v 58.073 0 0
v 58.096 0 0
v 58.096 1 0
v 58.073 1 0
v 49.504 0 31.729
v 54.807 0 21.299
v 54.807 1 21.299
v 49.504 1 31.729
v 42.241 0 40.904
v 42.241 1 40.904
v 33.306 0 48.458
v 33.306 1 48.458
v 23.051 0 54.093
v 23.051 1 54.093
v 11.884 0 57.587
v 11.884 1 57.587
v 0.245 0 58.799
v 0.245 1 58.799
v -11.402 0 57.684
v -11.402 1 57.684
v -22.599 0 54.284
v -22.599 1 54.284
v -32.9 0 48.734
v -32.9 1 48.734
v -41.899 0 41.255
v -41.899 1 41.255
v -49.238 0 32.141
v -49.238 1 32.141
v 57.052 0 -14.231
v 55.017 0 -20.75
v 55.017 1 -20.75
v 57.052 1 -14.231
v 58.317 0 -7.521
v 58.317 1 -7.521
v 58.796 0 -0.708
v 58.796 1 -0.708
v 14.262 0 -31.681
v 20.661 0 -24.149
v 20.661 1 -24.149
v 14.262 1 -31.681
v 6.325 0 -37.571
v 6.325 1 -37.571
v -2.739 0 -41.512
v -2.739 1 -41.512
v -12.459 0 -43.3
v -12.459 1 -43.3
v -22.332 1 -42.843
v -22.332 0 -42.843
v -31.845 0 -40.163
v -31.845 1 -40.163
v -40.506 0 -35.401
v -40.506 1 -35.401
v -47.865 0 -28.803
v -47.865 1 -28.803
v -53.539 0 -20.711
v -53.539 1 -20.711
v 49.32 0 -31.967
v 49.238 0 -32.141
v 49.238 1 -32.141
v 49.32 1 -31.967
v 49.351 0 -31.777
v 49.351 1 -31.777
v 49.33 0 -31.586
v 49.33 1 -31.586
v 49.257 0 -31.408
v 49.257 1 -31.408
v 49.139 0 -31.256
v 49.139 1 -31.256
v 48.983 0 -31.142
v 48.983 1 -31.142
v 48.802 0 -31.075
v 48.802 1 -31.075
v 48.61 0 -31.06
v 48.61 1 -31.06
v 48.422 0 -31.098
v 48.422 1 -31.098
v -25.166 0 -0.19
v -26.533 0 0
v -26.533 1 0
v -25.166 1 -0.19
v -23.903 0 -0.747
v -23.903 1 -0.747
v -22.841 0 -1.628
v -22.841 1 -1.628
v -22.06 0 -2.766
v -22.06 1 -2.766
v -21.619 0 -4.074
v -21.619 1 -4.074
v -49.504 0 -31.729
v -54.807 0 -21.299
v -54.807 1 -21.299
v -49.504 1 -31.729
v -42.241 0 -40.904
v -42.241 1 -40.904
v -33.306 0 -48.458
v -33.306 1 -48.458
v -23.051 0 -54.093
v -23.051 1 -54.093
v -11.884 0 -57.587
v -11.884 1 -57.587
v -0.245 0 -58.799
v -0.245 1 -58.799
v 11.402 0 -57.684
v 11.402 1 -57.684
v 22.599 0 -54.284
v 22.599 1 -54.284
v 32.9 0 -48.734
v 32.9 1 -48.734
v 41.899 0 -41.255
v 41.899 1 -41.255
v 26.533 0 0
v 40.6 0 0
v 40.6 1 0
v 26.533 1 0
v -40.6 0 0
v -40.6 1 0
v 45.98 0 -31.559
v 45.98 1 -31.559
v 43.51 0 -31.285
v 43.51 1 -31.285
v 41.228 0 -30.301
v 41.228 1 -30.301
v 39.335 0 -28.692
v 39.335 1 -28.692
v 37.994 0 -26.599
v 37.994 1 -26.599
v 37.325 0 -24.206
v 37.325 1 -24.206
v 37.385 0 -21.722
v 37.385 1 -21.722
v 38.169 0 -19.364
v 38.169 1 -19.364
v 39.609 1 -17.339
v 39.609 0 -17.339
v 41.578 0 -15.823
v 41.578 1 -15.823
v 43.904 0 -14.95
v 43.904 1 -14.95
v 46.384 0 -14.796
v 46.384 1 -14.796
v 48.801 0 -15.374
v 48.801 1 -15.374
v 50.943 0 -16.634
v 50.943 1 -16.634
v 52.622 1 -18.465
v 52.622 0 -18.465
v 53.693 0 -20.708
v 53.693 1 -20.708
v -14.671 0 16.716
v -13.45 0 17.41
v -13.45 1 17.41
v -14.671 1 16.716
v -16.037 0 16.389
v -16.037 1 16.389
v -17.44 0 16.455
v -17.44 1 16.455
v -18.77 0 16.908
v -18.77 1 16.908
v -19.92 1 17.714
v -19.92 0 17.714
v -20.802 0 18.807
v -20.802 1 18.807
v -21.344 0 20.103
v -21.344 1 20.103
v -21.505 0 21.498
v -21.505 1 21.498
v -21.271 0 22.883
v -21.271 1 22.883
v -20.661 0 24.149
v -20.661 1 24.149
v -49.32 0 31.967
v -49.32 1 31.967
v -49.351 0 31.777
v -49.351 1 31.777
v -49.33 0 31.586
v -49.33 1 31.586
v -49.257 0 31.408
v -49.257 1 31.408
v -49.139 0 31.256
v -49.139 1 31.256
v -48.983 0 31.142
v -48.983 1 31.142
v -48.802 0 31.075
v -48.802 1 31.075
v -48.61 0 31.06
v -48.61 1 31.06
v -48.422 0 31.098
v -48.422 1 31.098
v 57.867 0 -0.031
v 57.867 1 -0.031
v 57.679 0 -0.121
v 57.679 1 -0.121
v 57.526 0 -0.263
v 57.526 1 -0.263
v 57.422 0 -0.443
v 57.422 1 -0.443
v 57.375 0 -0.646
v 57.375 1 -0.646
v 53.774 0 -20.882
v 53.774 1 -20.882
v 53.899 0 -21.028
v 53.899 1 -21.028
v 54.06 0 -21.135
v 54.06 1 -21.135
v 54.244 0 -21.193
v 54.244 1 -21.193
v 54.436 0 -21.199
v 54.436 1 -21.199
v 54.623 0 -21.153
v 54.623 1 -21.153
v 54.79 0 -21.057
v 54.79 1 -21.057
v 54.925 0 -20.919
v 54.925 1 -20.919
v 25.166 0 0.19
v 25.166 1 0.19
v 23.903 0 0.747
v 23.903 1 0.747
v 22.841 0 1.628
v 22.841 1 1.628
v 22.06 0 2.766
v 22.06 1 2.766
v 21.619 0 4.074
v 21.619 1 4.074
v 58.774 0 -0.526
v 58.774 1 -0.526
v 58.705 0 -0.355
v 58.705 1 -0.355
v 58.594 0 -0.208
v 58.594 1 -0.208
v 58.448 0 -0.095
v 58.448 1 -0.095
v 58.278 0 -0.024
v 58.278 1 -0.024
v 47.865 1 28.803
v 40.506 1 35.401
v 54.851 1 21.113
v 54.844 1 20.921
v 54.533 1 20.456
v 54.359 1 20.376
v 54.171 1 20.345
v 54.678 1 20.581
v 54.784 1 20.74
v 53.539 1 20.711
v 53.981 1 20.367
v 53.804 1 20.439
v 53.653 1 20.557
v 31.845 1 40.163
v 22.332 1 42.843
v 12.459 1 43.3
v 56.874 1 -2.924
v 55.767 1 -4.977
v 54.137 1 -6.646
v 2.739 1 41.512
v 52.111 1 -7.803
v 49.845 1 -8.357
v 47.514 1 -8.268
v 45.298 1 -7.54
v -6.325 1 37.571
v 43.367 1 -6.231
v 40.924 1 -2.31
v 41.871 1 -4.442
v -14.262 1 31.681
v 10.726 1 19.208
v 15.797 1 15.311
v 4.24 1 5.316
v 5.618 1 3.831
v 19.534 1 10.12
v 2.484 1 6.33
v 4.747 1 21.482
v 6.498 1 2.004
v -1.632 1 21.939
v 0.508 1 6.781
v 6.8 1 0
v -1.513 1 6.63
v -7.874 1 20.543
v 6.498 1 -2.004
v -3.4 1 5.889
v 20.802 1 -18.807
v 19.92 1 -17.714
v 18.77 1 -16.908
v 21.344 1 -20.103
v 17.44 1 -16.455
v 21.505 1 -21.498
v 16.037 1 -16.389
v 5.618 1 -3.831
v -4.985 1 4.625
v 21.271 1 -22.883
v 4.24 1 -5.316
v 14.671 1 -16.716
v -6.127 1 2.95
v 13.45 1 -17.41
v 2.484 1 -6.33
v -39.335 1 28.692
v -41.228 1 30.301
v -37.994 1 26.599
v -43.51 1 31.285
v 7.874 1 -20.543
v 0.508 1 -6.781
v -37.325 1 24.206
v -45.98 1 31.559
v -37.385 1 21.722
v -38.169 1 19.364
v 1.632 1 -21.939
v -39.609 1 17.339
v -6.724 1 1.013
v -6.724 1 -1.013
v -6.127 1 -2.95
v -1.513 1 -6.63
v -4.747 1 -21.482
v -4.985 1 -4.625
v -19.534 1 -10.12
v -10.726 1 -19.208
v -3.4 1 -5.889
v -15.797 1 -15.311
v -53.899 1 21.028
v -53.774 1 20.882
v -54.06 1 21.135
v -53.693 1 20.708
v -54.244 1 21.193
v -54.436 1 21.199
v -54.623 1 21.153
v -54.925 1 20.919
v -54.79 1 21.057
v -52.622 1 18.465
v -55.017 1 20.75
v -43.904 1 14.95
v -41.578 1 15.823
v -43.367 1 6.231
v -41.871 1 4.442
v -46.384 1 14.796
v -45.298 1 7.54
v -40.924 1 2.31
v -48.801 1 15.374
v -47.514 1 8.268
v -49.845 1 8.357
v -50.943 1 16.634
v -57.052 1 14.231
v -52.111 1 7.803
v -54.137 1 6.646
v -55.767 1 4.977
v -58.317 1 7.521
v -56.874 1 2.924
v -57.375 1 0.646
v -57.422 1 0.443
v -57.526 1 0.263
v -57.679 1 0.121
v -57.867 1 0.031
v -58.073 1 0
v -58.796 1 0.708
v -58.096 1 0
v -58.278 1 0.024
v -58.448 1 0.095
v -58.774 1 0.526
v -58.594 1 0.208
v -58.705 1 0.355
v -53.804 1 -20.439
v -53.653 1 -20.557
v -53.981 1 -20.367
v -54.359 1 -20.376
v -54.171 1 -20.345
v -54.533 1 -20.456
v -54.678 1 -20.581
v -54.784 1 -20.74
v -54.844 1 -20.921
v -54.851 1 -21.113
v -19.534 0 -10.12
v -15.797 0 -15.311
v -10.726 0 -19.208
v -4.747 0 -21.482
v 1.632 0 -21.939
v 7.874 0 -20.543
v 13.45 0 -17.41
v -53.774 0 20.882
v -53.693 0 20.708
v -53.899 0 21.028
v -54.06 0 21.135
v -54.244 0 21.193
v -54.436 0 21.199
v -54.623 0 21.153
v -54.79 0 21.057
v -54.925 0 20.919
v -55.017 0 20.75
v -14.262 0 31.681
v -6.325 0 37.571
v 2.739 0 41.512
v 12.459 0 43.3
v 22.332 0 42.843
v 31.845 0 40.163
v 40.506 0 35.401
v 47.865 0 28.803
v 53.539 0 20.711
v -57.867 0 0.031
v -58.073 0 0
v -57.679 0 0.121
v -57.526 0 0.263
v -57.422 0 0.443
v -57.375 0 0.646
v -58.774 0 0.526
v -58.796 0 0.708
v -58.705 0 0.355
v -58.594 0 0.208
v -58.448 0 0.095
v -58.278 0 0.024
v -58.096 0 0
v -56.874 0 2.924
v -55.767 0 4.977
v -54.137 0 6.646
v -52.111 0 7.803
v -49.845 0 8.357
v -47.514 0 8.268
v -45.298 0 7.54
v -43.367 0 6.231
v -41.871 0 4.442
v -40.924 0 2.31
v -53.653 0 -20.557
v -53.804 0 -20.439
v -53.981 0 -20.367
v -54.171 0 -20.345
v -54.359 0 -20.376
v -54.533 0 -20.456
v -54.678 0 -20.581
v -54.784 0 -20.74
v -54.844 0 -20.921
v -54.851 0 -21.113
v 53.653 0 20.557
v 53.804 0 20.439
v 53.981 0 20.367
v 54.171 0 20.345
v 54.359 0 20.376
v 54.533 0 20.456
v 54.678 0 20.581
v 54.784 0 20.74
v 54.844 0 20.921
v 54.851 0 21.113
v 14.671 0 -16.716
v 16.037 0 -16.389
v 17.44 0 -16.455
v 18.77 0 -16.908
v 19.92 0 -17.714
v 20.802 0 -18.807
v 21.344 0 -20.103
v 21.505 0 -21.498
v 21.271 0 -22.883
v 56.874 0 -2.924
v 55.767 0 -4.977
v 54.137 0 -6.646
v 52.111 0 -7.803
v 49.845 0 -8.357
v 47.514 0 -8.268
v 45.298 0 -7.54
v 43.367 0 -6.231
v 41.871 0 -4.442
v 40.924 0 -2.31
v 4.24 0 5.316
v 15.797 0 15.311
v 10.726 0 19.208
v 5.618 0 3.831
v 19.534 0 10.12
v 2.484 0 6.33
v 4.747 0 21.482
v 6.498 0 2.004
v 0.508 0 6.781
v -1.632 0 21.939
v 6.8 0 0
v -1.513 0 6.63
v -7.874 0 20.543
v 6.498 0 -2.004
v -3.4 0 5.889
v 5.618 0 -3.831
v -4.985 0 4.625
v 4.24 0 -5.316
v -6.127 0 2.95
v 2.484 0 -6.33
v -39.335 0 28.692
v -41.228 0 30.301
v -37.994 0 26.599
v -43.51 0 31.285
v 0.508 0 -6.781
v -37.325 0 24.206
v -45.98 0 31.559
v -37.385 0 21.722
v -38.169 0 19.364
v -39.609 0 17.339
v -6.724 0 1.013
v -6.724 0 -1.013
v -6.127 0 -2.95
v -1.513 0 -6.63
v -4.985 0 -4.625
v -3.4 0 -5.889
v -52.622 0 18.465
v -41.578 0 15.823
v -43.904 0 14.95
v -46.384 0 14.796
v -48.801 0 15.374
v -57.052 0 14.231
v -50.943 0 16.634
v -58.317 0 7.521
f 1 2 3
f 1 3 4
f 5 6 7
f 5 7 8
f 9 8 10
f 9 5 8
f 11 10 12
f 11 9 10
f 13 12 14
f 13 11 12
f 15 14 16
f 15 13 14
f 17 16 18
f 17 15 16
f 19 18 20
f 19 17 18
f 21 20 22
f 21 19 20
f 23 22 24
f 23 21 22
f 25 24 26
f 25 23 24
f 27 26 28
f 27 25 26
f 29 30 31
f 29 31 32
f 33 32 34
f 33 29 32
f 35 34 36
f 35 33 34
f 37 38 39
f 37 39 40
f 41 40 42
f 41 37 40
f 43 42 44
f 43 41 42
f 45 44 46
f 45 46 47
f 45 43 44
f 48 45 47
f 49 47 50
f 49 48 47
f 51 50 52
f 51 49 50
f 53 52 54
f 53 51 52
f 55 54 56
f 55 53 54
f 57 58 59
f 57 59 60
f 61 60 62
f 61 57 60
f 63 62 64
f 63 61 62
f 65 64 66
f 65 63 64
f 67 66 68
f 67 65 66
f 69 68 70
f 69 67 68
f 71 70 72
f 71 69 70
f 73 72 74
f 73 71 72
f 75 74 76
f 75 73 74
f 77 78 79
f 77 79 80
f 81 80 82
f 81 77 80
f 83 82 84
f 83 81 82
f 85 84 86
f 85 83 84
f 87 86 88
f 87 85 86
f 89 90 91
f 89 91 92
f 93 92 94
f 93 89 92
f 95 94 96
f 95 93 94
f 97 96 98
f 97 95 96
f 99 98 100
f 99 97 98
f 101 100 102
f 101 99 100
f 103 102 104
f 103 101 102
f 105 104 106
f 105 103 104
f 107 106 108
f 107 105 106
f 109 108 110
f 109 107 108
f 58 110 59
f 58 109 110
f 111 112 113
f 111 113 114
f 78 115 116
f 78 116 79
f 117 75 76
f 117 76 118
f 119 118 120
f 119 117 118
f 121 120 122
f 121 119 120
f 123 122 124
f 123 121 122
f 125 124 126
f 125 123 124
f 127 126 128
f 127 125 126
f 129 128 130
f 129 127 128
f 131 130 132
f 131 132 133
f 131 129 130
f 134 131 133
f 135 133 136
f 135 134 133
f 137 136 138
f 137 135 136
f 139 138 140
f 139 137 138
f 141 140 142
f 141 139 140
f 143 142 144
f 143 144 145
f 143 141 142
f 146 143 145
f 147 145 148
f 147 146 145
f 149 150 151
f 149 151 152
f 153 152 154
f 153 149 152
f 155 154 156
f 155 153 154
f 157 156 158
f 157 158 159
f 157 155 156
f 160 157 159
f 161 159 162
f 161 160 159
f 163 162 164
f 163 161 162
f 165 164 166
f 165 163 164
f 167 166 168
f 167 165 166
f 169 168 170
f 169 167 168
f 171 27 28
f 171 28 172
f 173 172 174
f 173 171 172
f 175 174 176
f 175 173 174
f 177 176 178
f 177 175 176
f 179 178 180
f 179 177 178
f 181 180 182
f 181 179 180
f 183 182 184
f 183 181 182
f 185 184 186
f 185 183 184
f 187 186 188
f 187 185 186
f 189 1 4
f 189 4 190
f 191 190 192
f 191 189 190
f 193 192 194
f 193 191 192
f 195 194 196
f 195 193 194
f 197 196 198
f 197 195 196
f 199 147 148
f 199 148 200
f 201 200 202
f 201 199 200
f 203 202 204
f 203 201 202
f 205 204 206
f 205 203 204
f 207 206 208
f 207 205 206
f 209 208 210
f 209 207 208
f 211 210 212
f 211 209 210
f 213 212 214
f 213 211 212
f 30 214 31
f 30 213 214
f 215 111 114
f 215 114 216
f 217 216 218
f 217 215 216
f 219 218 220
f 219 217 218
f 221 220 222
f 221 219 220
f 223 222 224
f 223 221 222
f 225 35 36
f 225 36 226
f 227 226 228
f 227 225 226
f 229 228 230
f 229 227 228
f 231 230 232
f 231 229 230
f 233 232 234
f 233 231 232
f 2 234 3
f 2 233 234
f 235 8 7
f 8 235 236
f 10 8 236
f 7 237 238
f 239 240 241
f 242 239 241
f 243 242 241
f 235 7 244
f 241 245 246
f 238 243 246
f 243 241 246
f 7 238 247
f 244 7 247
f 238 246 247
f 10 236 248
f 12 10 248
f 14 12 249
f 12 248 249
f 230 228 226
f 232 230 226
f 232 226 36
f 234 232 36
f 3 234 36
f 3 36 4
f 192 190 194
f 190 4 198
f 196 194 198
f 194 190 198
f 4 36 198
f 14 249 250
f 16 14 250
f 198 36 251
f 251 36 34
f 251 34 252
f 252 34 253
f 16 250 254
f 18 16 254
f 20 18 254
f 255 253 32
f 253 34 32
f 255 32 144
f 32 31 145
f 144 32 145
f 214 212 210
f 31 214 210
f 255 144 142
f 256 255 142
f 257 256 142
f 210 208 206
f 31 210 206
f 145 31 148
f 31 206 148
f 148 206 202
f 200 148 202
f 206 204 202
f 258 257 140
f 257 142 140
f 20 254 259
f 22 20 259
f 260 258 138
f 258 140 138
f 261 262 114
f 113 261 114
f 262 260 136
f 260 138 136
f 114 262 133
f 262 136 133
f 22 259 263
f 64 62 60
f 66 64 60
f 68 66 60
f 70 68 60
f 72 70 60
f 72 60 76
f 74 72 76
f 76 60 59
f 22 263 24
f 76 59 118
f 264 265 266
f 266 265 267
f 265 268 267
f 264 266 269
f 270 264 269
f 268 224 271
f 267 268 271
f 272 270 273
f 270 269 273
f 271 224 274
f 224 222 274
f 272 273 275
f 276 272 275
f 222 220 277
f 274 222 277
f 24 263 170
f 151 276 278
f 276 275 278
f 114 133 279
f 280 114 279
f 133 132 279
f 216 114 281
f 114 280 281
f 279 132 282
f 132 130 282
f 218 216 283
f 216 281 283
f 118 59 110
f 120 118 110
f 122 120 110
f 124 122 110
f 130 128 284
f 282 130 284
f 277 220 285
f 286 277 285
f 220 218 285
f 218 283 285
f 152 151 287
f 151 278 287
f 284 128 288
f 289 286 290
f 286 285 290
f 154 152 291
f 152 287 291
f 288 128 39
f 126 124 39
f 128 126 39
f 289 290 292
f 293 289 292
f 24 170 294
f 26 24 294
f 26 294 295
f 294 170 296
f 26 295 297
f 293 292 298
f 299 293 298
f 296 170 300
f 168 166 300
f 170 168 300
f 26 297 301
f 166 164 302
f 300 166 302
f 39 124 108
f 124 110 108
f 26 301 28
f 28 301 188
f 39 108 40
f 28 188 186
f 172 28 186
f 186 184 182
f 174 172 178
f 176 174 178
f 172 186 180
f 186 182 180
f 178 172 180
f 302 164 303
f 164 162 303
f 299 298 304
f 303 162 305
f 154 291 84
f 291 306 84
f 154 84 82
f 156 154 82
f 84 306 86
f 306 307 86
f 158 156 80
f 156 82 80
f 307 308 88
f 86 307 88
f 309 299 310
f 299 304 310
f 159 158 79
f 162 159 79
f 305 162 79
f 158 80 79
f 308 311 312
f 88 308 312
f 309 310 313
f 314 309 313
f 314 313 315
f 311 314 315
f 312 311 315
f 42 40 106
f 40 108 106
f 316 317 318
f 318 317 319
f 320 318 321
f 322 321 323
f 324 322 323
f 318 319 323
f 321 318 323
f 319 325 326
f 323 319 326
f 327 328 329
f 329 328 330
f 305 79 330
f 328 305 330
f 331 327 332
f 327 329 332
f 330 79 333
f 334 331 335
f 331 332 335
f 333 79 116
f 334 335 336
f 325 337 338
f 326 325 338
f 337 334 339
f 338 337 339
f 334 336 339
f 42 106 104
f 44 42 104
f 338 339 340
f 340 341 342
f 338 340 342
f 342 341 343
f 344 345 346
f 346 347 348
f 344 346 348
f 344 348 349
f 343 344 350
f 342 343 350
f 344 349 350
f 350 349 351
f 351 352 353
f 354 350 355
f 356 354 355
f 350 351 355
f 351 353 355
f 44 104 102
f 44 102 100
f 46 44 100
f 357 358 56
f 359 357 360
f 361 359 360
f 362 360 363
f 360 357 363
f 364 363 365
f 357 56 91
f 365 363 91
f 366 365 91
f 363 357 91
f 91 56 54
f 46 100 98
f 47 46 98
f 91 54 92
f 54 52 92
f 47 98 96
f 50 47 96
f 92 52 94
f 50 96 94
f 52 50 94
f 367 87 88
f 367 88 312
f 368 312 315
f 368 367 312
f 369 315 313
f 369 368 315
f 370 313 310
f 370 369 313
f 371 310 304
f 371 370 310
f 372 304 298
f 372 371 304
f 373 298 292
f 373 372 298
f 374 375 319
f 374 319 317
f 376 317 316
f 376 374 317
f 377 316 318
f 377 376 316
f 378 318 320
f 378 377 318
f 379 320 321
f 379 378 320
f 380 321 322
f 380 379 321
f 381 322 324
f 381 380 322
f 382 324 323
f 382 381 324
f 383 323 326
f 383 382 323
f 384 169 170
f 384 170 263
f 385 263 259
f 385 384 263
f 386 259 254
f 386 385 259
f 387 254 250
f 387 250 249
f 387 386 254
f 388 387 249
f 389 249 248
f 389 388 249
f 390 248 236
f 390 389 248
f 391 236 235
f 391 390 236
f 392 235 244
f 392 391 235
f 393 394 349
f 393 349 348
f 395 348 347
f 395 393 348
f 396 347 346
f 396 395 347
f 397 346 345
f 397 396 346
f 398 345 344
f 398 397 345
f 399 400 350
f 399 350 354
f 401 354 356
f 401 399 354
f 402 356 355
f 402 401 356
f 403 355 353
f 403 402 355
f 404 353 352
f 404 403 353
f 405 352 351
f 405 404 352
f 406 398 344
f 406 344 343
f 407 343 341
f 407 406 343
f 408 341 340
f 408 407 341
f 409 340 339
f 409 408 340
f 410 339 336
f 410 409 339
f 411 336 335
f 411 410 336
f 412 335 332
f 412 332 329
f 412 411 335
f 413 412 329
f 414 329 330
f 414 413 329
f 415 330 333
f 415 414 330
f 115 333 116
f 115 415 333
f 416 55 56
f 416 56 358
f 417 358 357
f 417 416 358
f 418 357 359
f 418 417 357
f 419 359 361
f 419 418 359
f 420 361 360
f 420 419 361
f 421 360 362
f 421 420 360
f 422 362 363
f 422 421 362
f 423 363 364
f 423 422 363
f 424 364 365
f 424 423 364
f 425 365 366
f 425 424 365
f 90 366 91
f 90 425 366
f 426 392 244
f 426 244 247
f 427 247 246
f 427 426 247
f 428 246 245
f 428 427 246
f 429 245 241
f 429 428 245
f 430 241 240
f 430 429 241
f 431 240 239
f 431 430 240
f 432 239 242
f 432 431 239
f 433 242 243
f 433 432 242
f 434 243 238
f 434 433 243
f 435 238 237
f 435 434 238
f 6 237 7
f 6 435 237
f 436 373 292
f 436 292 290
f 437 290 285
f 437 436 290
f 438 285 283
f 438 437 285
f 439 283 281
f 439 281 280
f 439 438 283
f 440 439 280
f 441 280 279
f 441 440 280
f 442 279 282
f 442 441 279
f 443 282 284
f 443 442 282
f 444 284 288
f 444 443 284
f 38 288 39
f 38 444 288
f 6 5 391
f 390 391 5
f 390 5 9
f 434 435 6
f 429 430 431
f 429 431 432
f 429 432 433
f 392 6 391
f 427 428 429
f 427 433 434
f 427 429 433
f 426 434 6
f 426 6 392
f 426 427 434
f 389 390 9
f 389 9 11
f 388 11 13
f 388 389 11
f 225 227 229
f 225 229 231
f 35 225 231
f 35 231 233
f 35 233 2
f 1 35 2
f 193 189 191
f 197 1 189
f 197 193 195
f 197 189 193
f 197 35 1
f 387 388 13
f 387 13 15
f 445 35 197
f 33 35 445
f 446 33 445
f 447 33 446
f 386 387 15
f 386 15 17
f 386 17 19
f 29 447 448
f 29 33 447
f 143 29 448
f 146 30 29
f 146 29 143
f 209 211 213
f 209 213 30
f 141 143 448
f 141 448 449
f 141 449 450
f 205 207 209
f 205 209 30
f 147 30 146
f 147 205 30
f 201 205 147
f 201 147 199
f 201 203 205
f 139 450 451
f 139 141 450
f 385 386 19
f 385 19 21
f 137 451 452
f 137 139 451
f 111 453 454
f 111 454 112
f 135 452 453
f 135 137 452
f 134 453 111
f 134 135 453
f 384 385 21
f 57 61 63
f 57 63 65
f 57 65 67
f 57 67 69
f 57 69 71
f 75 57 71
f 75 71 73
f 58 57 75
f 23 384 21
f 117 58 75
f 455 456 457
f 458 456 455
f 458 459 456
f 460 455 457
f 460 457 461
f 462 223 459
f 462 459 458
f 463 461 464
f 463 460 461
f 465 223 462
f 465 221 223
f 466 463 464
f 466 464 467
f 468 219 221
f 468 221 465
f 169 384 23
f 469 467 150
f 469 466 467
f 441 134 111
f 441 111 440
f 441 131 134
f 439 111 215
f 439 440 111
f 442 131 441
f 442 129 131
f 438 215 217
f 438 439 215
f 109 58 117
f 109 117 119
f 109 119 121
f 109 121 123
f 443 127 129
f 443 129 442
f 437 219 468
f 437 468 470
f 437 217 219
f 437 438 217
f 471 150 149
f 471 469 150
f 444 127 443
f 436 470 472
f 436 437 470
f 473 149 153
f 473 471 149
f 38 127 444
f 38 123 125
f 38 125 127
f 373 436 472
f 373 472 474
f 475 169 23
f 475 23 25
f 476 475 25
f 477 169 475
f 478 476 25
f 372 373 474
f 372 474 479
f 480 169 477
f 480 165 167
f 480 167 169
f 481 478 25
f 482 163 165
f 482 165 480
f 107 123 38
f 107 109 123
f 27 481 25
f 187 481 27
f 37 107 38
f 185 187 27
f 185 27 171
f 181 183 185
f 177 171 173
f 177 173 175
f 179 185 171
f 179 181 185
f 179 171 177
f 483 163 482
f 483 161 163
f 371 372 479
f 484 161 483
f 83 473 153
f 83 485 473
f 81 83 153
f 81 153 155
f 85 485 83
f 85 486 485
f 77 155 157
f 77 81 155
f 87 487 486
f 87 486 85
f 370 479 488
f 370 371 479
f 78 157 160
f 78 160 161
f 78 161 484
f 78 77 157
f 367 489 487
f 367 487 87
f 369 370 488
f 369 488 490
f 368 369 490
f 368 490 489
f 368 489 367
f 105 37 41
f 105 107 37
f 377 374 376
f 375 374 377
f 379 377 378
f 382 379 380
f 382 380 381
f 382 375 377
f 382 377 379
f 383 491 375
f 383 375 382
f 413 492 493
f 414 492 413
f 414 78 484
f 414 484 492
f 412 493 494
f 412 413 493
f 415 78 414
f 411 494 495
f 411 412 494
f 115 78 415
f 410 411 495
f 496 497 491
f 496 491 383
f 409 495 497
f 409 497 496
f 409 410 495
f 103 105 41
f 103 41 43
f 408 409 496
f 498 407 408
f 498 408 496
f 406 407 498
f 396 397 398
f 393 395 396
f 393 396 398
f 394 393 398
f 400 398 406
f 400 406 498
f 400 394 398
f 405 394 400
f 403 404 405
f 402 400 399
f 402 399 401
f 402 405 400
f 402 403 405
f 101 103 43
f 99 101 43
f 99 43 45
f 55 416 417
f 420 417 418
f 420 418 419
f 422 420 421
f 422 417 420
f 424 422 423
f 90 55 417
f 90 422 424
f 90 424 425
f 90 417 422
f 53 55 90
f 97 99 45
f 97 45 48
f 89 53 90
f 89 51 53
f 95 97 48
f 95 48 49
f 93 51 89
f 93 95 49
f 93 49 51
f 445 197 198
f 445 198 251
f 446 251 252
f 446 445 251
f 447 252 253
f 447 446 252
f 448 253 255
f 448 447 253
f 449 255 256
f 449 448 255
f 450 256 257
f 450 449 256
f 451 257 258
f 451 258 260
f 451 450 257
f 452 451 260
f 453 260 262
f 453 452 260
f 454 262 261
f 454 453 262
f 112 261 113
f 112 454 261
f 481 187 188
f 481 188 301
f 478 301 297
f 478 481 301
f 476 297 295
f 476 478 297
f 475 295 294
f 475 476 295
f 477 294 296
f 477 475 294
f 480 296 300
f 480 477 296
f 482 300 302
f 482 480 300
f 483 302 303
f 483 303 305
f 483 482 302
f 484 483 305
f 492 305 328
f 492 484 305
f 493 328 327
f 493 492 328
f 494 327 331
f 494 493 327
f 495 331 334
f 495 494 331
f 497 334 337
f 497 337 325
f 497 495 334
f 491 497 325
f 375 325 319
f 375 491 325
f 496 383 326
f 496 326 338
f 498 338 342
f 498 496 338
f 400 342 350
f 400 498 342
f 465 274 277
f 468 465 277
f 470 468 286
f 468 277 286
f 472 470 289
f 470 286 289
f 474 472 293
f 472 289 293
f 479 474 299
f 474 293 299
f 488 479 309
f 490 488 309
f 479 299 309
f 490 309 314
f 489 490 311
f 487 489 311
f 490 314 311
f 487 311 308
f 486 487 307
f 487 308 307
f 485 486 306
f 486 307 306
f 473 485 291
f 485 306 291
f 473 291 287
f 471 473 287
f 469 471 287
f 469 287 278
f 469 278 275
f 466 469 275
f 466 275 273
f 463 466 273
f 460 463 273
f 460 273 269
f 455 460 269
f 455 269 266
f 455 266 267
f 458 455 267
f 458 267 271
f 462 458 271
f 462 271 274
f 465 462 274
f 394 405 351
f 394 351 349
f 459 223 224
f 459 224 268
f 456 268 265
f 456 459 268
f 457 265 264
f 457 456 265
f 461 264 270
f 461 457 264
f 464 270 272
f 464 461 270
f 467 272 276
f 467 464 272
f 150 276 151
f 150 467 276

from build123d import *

# Parameters (mm, degrees)
BOSS_EXTRUDE1_DEPTH = 1
SKETCH3_R           = 6.8
CUT_EXTRUDE1_DEPTH  = 10


with BuildPart() as part:
    # Sketch1 → Boss-Extrude1 (new body)
    with BuildSketch(Plane(origin=(0, 0, 0), x_dir=(1, 0, 0), z_dir=(0, 1, 0))):
        with BuildLine():
            Line((-58.095782979, 0), (-58.073036978, 0))
            ThreePointArc((-58.073036978, 0), (-57.597480623, -0.18634043), (-57.375111056, -0.646153846))
            ThreePointArc((-57.375111056, -0.646153846), (-48.676683494, -8.393775458), (-40.6, 0))
            Line((-40.6, 0), (-26.532998323, 0))
            ThreePointArc((-26.532998323, 0), (-23.34157463, 1.150998205), (-21.619480115, 4.074074074))
            ThreePointArc((-21.619480115, 4.074074074), (-7.819670385, 20.563383843), (13.44973545, 17.409899952))
            ThreePointArc((13.44973545, 17.409899952), (19.920363156, 17.713546888), (20.660984848, 24.148817192))
            ThreePointArc((20.660984848, 24.148817192), (-17.408618139, 43.353494129), (-53.539393939, 20.711026772))
            ThreePointArc((-53.539393939, 20.711026772), (-54.448939175, 20.409991078), (-54.807009858, 21.298630718))
            ThreePointArc((-54.807009858, 21.298630718), (-6.094732075, 58.483281722), (49.237842792, 32.141481565))
            ThreePointArc((49.237842792, 32.141481565), (49.203069762, 31.327605826), (48.421551499, 31.097753513))
            ThreePointArc((48.421551499, 31.097753513), (38.168934267, 19.364205559), (53.692695632, 20.707760837))
            ThreePointArc((53.692695632, 20.707760837), (54.339746442, 21.20266298), (55.017049011, 20.750043811))
            ThreePointArc((55.017049011, 20.750043811), (57.781950674, 10.894318531), (58.795732172, 0.708433735))
            ThreePointArc((58.795732172, 0.708433735), (58.593730574, 0.208016065), (58.095782979, 0))
            Line((58.095782979, 0), (58.073036978, 0))
            ThreePointArc((58.073036978, 0), (57.597480623, 0.18634043), (57.375111056, 0.646153846))
            ThreePointArc((57.375111056, 0.646153846), (48.676683494, 8.393775458), (40.6, 0))
            Line((40.6, 0), (26.532998323, 0))
            ThreePointArc((26.532998323, 0), (23.34157463, -1.150998205), (21.619480115, -4.074074074))
            ThreePointArc((21.619480115, -4.074074074), (7.819670385, -20.563383843), (-13.44973545, -17.409899952))
            ThreePointArc((-13.44973545, -17.409899952), (-19.920363156, -17.713546888), (-20.660984848, -24.148817192))
            ThreePointArc((-20.660984848, -24.148817192), (17.408618139, -43.353494129), (53.539393939, -20.711026772))
            ThreePointArc((53.539393939, -20.711026772), (54.448939175, -20.409991078), (54.807009858, -21.298630718))
            ThreePointArc((54.807009858, -21.298630718), (6.094732075, -58.483281722), (-49.237842792, -32.141481565))
            ThreePointArc((-49.237842792, -32.141481565), (-49.203069762, -31.327605826), (-48.421551499, -31.097753513))
            ThreePointArc((-48.421551499, -31.097753513), (-38.168934267, -19.364205559), (-53.692695632, -20.707760837))
            ThreePointArc((-53.692695632, -20.707760837), (-54.339746442, -21.20266298), (-55.017049011, -20.750043811))
            ThreePointArc((-55.017049011, -20.750043811), (-57.781950674, -10.894318531), (-58.795732172, -0.708433735))
            ThreePointArc((-58.795732172, -0.708433735), (-58.593730574, -0.208016065), (-58.095782979, 0))
        make_face()
    extrude(amount=BOSS_EXTRUDE1_DEPTH)

    # Sketch3 → Cut-Extrude1 (cut)
    with BuildSketch(Plane(origin=(0, 1, 0), x_dir=(1, 0, 0), z_dir=(0, 1, 0))):
        Circle(SKETCH3_R)
    extrude(amount=-CUT_EXTRUDE1_DEPTH, mode=Mode.SUBTRACT)


solid = part.part
